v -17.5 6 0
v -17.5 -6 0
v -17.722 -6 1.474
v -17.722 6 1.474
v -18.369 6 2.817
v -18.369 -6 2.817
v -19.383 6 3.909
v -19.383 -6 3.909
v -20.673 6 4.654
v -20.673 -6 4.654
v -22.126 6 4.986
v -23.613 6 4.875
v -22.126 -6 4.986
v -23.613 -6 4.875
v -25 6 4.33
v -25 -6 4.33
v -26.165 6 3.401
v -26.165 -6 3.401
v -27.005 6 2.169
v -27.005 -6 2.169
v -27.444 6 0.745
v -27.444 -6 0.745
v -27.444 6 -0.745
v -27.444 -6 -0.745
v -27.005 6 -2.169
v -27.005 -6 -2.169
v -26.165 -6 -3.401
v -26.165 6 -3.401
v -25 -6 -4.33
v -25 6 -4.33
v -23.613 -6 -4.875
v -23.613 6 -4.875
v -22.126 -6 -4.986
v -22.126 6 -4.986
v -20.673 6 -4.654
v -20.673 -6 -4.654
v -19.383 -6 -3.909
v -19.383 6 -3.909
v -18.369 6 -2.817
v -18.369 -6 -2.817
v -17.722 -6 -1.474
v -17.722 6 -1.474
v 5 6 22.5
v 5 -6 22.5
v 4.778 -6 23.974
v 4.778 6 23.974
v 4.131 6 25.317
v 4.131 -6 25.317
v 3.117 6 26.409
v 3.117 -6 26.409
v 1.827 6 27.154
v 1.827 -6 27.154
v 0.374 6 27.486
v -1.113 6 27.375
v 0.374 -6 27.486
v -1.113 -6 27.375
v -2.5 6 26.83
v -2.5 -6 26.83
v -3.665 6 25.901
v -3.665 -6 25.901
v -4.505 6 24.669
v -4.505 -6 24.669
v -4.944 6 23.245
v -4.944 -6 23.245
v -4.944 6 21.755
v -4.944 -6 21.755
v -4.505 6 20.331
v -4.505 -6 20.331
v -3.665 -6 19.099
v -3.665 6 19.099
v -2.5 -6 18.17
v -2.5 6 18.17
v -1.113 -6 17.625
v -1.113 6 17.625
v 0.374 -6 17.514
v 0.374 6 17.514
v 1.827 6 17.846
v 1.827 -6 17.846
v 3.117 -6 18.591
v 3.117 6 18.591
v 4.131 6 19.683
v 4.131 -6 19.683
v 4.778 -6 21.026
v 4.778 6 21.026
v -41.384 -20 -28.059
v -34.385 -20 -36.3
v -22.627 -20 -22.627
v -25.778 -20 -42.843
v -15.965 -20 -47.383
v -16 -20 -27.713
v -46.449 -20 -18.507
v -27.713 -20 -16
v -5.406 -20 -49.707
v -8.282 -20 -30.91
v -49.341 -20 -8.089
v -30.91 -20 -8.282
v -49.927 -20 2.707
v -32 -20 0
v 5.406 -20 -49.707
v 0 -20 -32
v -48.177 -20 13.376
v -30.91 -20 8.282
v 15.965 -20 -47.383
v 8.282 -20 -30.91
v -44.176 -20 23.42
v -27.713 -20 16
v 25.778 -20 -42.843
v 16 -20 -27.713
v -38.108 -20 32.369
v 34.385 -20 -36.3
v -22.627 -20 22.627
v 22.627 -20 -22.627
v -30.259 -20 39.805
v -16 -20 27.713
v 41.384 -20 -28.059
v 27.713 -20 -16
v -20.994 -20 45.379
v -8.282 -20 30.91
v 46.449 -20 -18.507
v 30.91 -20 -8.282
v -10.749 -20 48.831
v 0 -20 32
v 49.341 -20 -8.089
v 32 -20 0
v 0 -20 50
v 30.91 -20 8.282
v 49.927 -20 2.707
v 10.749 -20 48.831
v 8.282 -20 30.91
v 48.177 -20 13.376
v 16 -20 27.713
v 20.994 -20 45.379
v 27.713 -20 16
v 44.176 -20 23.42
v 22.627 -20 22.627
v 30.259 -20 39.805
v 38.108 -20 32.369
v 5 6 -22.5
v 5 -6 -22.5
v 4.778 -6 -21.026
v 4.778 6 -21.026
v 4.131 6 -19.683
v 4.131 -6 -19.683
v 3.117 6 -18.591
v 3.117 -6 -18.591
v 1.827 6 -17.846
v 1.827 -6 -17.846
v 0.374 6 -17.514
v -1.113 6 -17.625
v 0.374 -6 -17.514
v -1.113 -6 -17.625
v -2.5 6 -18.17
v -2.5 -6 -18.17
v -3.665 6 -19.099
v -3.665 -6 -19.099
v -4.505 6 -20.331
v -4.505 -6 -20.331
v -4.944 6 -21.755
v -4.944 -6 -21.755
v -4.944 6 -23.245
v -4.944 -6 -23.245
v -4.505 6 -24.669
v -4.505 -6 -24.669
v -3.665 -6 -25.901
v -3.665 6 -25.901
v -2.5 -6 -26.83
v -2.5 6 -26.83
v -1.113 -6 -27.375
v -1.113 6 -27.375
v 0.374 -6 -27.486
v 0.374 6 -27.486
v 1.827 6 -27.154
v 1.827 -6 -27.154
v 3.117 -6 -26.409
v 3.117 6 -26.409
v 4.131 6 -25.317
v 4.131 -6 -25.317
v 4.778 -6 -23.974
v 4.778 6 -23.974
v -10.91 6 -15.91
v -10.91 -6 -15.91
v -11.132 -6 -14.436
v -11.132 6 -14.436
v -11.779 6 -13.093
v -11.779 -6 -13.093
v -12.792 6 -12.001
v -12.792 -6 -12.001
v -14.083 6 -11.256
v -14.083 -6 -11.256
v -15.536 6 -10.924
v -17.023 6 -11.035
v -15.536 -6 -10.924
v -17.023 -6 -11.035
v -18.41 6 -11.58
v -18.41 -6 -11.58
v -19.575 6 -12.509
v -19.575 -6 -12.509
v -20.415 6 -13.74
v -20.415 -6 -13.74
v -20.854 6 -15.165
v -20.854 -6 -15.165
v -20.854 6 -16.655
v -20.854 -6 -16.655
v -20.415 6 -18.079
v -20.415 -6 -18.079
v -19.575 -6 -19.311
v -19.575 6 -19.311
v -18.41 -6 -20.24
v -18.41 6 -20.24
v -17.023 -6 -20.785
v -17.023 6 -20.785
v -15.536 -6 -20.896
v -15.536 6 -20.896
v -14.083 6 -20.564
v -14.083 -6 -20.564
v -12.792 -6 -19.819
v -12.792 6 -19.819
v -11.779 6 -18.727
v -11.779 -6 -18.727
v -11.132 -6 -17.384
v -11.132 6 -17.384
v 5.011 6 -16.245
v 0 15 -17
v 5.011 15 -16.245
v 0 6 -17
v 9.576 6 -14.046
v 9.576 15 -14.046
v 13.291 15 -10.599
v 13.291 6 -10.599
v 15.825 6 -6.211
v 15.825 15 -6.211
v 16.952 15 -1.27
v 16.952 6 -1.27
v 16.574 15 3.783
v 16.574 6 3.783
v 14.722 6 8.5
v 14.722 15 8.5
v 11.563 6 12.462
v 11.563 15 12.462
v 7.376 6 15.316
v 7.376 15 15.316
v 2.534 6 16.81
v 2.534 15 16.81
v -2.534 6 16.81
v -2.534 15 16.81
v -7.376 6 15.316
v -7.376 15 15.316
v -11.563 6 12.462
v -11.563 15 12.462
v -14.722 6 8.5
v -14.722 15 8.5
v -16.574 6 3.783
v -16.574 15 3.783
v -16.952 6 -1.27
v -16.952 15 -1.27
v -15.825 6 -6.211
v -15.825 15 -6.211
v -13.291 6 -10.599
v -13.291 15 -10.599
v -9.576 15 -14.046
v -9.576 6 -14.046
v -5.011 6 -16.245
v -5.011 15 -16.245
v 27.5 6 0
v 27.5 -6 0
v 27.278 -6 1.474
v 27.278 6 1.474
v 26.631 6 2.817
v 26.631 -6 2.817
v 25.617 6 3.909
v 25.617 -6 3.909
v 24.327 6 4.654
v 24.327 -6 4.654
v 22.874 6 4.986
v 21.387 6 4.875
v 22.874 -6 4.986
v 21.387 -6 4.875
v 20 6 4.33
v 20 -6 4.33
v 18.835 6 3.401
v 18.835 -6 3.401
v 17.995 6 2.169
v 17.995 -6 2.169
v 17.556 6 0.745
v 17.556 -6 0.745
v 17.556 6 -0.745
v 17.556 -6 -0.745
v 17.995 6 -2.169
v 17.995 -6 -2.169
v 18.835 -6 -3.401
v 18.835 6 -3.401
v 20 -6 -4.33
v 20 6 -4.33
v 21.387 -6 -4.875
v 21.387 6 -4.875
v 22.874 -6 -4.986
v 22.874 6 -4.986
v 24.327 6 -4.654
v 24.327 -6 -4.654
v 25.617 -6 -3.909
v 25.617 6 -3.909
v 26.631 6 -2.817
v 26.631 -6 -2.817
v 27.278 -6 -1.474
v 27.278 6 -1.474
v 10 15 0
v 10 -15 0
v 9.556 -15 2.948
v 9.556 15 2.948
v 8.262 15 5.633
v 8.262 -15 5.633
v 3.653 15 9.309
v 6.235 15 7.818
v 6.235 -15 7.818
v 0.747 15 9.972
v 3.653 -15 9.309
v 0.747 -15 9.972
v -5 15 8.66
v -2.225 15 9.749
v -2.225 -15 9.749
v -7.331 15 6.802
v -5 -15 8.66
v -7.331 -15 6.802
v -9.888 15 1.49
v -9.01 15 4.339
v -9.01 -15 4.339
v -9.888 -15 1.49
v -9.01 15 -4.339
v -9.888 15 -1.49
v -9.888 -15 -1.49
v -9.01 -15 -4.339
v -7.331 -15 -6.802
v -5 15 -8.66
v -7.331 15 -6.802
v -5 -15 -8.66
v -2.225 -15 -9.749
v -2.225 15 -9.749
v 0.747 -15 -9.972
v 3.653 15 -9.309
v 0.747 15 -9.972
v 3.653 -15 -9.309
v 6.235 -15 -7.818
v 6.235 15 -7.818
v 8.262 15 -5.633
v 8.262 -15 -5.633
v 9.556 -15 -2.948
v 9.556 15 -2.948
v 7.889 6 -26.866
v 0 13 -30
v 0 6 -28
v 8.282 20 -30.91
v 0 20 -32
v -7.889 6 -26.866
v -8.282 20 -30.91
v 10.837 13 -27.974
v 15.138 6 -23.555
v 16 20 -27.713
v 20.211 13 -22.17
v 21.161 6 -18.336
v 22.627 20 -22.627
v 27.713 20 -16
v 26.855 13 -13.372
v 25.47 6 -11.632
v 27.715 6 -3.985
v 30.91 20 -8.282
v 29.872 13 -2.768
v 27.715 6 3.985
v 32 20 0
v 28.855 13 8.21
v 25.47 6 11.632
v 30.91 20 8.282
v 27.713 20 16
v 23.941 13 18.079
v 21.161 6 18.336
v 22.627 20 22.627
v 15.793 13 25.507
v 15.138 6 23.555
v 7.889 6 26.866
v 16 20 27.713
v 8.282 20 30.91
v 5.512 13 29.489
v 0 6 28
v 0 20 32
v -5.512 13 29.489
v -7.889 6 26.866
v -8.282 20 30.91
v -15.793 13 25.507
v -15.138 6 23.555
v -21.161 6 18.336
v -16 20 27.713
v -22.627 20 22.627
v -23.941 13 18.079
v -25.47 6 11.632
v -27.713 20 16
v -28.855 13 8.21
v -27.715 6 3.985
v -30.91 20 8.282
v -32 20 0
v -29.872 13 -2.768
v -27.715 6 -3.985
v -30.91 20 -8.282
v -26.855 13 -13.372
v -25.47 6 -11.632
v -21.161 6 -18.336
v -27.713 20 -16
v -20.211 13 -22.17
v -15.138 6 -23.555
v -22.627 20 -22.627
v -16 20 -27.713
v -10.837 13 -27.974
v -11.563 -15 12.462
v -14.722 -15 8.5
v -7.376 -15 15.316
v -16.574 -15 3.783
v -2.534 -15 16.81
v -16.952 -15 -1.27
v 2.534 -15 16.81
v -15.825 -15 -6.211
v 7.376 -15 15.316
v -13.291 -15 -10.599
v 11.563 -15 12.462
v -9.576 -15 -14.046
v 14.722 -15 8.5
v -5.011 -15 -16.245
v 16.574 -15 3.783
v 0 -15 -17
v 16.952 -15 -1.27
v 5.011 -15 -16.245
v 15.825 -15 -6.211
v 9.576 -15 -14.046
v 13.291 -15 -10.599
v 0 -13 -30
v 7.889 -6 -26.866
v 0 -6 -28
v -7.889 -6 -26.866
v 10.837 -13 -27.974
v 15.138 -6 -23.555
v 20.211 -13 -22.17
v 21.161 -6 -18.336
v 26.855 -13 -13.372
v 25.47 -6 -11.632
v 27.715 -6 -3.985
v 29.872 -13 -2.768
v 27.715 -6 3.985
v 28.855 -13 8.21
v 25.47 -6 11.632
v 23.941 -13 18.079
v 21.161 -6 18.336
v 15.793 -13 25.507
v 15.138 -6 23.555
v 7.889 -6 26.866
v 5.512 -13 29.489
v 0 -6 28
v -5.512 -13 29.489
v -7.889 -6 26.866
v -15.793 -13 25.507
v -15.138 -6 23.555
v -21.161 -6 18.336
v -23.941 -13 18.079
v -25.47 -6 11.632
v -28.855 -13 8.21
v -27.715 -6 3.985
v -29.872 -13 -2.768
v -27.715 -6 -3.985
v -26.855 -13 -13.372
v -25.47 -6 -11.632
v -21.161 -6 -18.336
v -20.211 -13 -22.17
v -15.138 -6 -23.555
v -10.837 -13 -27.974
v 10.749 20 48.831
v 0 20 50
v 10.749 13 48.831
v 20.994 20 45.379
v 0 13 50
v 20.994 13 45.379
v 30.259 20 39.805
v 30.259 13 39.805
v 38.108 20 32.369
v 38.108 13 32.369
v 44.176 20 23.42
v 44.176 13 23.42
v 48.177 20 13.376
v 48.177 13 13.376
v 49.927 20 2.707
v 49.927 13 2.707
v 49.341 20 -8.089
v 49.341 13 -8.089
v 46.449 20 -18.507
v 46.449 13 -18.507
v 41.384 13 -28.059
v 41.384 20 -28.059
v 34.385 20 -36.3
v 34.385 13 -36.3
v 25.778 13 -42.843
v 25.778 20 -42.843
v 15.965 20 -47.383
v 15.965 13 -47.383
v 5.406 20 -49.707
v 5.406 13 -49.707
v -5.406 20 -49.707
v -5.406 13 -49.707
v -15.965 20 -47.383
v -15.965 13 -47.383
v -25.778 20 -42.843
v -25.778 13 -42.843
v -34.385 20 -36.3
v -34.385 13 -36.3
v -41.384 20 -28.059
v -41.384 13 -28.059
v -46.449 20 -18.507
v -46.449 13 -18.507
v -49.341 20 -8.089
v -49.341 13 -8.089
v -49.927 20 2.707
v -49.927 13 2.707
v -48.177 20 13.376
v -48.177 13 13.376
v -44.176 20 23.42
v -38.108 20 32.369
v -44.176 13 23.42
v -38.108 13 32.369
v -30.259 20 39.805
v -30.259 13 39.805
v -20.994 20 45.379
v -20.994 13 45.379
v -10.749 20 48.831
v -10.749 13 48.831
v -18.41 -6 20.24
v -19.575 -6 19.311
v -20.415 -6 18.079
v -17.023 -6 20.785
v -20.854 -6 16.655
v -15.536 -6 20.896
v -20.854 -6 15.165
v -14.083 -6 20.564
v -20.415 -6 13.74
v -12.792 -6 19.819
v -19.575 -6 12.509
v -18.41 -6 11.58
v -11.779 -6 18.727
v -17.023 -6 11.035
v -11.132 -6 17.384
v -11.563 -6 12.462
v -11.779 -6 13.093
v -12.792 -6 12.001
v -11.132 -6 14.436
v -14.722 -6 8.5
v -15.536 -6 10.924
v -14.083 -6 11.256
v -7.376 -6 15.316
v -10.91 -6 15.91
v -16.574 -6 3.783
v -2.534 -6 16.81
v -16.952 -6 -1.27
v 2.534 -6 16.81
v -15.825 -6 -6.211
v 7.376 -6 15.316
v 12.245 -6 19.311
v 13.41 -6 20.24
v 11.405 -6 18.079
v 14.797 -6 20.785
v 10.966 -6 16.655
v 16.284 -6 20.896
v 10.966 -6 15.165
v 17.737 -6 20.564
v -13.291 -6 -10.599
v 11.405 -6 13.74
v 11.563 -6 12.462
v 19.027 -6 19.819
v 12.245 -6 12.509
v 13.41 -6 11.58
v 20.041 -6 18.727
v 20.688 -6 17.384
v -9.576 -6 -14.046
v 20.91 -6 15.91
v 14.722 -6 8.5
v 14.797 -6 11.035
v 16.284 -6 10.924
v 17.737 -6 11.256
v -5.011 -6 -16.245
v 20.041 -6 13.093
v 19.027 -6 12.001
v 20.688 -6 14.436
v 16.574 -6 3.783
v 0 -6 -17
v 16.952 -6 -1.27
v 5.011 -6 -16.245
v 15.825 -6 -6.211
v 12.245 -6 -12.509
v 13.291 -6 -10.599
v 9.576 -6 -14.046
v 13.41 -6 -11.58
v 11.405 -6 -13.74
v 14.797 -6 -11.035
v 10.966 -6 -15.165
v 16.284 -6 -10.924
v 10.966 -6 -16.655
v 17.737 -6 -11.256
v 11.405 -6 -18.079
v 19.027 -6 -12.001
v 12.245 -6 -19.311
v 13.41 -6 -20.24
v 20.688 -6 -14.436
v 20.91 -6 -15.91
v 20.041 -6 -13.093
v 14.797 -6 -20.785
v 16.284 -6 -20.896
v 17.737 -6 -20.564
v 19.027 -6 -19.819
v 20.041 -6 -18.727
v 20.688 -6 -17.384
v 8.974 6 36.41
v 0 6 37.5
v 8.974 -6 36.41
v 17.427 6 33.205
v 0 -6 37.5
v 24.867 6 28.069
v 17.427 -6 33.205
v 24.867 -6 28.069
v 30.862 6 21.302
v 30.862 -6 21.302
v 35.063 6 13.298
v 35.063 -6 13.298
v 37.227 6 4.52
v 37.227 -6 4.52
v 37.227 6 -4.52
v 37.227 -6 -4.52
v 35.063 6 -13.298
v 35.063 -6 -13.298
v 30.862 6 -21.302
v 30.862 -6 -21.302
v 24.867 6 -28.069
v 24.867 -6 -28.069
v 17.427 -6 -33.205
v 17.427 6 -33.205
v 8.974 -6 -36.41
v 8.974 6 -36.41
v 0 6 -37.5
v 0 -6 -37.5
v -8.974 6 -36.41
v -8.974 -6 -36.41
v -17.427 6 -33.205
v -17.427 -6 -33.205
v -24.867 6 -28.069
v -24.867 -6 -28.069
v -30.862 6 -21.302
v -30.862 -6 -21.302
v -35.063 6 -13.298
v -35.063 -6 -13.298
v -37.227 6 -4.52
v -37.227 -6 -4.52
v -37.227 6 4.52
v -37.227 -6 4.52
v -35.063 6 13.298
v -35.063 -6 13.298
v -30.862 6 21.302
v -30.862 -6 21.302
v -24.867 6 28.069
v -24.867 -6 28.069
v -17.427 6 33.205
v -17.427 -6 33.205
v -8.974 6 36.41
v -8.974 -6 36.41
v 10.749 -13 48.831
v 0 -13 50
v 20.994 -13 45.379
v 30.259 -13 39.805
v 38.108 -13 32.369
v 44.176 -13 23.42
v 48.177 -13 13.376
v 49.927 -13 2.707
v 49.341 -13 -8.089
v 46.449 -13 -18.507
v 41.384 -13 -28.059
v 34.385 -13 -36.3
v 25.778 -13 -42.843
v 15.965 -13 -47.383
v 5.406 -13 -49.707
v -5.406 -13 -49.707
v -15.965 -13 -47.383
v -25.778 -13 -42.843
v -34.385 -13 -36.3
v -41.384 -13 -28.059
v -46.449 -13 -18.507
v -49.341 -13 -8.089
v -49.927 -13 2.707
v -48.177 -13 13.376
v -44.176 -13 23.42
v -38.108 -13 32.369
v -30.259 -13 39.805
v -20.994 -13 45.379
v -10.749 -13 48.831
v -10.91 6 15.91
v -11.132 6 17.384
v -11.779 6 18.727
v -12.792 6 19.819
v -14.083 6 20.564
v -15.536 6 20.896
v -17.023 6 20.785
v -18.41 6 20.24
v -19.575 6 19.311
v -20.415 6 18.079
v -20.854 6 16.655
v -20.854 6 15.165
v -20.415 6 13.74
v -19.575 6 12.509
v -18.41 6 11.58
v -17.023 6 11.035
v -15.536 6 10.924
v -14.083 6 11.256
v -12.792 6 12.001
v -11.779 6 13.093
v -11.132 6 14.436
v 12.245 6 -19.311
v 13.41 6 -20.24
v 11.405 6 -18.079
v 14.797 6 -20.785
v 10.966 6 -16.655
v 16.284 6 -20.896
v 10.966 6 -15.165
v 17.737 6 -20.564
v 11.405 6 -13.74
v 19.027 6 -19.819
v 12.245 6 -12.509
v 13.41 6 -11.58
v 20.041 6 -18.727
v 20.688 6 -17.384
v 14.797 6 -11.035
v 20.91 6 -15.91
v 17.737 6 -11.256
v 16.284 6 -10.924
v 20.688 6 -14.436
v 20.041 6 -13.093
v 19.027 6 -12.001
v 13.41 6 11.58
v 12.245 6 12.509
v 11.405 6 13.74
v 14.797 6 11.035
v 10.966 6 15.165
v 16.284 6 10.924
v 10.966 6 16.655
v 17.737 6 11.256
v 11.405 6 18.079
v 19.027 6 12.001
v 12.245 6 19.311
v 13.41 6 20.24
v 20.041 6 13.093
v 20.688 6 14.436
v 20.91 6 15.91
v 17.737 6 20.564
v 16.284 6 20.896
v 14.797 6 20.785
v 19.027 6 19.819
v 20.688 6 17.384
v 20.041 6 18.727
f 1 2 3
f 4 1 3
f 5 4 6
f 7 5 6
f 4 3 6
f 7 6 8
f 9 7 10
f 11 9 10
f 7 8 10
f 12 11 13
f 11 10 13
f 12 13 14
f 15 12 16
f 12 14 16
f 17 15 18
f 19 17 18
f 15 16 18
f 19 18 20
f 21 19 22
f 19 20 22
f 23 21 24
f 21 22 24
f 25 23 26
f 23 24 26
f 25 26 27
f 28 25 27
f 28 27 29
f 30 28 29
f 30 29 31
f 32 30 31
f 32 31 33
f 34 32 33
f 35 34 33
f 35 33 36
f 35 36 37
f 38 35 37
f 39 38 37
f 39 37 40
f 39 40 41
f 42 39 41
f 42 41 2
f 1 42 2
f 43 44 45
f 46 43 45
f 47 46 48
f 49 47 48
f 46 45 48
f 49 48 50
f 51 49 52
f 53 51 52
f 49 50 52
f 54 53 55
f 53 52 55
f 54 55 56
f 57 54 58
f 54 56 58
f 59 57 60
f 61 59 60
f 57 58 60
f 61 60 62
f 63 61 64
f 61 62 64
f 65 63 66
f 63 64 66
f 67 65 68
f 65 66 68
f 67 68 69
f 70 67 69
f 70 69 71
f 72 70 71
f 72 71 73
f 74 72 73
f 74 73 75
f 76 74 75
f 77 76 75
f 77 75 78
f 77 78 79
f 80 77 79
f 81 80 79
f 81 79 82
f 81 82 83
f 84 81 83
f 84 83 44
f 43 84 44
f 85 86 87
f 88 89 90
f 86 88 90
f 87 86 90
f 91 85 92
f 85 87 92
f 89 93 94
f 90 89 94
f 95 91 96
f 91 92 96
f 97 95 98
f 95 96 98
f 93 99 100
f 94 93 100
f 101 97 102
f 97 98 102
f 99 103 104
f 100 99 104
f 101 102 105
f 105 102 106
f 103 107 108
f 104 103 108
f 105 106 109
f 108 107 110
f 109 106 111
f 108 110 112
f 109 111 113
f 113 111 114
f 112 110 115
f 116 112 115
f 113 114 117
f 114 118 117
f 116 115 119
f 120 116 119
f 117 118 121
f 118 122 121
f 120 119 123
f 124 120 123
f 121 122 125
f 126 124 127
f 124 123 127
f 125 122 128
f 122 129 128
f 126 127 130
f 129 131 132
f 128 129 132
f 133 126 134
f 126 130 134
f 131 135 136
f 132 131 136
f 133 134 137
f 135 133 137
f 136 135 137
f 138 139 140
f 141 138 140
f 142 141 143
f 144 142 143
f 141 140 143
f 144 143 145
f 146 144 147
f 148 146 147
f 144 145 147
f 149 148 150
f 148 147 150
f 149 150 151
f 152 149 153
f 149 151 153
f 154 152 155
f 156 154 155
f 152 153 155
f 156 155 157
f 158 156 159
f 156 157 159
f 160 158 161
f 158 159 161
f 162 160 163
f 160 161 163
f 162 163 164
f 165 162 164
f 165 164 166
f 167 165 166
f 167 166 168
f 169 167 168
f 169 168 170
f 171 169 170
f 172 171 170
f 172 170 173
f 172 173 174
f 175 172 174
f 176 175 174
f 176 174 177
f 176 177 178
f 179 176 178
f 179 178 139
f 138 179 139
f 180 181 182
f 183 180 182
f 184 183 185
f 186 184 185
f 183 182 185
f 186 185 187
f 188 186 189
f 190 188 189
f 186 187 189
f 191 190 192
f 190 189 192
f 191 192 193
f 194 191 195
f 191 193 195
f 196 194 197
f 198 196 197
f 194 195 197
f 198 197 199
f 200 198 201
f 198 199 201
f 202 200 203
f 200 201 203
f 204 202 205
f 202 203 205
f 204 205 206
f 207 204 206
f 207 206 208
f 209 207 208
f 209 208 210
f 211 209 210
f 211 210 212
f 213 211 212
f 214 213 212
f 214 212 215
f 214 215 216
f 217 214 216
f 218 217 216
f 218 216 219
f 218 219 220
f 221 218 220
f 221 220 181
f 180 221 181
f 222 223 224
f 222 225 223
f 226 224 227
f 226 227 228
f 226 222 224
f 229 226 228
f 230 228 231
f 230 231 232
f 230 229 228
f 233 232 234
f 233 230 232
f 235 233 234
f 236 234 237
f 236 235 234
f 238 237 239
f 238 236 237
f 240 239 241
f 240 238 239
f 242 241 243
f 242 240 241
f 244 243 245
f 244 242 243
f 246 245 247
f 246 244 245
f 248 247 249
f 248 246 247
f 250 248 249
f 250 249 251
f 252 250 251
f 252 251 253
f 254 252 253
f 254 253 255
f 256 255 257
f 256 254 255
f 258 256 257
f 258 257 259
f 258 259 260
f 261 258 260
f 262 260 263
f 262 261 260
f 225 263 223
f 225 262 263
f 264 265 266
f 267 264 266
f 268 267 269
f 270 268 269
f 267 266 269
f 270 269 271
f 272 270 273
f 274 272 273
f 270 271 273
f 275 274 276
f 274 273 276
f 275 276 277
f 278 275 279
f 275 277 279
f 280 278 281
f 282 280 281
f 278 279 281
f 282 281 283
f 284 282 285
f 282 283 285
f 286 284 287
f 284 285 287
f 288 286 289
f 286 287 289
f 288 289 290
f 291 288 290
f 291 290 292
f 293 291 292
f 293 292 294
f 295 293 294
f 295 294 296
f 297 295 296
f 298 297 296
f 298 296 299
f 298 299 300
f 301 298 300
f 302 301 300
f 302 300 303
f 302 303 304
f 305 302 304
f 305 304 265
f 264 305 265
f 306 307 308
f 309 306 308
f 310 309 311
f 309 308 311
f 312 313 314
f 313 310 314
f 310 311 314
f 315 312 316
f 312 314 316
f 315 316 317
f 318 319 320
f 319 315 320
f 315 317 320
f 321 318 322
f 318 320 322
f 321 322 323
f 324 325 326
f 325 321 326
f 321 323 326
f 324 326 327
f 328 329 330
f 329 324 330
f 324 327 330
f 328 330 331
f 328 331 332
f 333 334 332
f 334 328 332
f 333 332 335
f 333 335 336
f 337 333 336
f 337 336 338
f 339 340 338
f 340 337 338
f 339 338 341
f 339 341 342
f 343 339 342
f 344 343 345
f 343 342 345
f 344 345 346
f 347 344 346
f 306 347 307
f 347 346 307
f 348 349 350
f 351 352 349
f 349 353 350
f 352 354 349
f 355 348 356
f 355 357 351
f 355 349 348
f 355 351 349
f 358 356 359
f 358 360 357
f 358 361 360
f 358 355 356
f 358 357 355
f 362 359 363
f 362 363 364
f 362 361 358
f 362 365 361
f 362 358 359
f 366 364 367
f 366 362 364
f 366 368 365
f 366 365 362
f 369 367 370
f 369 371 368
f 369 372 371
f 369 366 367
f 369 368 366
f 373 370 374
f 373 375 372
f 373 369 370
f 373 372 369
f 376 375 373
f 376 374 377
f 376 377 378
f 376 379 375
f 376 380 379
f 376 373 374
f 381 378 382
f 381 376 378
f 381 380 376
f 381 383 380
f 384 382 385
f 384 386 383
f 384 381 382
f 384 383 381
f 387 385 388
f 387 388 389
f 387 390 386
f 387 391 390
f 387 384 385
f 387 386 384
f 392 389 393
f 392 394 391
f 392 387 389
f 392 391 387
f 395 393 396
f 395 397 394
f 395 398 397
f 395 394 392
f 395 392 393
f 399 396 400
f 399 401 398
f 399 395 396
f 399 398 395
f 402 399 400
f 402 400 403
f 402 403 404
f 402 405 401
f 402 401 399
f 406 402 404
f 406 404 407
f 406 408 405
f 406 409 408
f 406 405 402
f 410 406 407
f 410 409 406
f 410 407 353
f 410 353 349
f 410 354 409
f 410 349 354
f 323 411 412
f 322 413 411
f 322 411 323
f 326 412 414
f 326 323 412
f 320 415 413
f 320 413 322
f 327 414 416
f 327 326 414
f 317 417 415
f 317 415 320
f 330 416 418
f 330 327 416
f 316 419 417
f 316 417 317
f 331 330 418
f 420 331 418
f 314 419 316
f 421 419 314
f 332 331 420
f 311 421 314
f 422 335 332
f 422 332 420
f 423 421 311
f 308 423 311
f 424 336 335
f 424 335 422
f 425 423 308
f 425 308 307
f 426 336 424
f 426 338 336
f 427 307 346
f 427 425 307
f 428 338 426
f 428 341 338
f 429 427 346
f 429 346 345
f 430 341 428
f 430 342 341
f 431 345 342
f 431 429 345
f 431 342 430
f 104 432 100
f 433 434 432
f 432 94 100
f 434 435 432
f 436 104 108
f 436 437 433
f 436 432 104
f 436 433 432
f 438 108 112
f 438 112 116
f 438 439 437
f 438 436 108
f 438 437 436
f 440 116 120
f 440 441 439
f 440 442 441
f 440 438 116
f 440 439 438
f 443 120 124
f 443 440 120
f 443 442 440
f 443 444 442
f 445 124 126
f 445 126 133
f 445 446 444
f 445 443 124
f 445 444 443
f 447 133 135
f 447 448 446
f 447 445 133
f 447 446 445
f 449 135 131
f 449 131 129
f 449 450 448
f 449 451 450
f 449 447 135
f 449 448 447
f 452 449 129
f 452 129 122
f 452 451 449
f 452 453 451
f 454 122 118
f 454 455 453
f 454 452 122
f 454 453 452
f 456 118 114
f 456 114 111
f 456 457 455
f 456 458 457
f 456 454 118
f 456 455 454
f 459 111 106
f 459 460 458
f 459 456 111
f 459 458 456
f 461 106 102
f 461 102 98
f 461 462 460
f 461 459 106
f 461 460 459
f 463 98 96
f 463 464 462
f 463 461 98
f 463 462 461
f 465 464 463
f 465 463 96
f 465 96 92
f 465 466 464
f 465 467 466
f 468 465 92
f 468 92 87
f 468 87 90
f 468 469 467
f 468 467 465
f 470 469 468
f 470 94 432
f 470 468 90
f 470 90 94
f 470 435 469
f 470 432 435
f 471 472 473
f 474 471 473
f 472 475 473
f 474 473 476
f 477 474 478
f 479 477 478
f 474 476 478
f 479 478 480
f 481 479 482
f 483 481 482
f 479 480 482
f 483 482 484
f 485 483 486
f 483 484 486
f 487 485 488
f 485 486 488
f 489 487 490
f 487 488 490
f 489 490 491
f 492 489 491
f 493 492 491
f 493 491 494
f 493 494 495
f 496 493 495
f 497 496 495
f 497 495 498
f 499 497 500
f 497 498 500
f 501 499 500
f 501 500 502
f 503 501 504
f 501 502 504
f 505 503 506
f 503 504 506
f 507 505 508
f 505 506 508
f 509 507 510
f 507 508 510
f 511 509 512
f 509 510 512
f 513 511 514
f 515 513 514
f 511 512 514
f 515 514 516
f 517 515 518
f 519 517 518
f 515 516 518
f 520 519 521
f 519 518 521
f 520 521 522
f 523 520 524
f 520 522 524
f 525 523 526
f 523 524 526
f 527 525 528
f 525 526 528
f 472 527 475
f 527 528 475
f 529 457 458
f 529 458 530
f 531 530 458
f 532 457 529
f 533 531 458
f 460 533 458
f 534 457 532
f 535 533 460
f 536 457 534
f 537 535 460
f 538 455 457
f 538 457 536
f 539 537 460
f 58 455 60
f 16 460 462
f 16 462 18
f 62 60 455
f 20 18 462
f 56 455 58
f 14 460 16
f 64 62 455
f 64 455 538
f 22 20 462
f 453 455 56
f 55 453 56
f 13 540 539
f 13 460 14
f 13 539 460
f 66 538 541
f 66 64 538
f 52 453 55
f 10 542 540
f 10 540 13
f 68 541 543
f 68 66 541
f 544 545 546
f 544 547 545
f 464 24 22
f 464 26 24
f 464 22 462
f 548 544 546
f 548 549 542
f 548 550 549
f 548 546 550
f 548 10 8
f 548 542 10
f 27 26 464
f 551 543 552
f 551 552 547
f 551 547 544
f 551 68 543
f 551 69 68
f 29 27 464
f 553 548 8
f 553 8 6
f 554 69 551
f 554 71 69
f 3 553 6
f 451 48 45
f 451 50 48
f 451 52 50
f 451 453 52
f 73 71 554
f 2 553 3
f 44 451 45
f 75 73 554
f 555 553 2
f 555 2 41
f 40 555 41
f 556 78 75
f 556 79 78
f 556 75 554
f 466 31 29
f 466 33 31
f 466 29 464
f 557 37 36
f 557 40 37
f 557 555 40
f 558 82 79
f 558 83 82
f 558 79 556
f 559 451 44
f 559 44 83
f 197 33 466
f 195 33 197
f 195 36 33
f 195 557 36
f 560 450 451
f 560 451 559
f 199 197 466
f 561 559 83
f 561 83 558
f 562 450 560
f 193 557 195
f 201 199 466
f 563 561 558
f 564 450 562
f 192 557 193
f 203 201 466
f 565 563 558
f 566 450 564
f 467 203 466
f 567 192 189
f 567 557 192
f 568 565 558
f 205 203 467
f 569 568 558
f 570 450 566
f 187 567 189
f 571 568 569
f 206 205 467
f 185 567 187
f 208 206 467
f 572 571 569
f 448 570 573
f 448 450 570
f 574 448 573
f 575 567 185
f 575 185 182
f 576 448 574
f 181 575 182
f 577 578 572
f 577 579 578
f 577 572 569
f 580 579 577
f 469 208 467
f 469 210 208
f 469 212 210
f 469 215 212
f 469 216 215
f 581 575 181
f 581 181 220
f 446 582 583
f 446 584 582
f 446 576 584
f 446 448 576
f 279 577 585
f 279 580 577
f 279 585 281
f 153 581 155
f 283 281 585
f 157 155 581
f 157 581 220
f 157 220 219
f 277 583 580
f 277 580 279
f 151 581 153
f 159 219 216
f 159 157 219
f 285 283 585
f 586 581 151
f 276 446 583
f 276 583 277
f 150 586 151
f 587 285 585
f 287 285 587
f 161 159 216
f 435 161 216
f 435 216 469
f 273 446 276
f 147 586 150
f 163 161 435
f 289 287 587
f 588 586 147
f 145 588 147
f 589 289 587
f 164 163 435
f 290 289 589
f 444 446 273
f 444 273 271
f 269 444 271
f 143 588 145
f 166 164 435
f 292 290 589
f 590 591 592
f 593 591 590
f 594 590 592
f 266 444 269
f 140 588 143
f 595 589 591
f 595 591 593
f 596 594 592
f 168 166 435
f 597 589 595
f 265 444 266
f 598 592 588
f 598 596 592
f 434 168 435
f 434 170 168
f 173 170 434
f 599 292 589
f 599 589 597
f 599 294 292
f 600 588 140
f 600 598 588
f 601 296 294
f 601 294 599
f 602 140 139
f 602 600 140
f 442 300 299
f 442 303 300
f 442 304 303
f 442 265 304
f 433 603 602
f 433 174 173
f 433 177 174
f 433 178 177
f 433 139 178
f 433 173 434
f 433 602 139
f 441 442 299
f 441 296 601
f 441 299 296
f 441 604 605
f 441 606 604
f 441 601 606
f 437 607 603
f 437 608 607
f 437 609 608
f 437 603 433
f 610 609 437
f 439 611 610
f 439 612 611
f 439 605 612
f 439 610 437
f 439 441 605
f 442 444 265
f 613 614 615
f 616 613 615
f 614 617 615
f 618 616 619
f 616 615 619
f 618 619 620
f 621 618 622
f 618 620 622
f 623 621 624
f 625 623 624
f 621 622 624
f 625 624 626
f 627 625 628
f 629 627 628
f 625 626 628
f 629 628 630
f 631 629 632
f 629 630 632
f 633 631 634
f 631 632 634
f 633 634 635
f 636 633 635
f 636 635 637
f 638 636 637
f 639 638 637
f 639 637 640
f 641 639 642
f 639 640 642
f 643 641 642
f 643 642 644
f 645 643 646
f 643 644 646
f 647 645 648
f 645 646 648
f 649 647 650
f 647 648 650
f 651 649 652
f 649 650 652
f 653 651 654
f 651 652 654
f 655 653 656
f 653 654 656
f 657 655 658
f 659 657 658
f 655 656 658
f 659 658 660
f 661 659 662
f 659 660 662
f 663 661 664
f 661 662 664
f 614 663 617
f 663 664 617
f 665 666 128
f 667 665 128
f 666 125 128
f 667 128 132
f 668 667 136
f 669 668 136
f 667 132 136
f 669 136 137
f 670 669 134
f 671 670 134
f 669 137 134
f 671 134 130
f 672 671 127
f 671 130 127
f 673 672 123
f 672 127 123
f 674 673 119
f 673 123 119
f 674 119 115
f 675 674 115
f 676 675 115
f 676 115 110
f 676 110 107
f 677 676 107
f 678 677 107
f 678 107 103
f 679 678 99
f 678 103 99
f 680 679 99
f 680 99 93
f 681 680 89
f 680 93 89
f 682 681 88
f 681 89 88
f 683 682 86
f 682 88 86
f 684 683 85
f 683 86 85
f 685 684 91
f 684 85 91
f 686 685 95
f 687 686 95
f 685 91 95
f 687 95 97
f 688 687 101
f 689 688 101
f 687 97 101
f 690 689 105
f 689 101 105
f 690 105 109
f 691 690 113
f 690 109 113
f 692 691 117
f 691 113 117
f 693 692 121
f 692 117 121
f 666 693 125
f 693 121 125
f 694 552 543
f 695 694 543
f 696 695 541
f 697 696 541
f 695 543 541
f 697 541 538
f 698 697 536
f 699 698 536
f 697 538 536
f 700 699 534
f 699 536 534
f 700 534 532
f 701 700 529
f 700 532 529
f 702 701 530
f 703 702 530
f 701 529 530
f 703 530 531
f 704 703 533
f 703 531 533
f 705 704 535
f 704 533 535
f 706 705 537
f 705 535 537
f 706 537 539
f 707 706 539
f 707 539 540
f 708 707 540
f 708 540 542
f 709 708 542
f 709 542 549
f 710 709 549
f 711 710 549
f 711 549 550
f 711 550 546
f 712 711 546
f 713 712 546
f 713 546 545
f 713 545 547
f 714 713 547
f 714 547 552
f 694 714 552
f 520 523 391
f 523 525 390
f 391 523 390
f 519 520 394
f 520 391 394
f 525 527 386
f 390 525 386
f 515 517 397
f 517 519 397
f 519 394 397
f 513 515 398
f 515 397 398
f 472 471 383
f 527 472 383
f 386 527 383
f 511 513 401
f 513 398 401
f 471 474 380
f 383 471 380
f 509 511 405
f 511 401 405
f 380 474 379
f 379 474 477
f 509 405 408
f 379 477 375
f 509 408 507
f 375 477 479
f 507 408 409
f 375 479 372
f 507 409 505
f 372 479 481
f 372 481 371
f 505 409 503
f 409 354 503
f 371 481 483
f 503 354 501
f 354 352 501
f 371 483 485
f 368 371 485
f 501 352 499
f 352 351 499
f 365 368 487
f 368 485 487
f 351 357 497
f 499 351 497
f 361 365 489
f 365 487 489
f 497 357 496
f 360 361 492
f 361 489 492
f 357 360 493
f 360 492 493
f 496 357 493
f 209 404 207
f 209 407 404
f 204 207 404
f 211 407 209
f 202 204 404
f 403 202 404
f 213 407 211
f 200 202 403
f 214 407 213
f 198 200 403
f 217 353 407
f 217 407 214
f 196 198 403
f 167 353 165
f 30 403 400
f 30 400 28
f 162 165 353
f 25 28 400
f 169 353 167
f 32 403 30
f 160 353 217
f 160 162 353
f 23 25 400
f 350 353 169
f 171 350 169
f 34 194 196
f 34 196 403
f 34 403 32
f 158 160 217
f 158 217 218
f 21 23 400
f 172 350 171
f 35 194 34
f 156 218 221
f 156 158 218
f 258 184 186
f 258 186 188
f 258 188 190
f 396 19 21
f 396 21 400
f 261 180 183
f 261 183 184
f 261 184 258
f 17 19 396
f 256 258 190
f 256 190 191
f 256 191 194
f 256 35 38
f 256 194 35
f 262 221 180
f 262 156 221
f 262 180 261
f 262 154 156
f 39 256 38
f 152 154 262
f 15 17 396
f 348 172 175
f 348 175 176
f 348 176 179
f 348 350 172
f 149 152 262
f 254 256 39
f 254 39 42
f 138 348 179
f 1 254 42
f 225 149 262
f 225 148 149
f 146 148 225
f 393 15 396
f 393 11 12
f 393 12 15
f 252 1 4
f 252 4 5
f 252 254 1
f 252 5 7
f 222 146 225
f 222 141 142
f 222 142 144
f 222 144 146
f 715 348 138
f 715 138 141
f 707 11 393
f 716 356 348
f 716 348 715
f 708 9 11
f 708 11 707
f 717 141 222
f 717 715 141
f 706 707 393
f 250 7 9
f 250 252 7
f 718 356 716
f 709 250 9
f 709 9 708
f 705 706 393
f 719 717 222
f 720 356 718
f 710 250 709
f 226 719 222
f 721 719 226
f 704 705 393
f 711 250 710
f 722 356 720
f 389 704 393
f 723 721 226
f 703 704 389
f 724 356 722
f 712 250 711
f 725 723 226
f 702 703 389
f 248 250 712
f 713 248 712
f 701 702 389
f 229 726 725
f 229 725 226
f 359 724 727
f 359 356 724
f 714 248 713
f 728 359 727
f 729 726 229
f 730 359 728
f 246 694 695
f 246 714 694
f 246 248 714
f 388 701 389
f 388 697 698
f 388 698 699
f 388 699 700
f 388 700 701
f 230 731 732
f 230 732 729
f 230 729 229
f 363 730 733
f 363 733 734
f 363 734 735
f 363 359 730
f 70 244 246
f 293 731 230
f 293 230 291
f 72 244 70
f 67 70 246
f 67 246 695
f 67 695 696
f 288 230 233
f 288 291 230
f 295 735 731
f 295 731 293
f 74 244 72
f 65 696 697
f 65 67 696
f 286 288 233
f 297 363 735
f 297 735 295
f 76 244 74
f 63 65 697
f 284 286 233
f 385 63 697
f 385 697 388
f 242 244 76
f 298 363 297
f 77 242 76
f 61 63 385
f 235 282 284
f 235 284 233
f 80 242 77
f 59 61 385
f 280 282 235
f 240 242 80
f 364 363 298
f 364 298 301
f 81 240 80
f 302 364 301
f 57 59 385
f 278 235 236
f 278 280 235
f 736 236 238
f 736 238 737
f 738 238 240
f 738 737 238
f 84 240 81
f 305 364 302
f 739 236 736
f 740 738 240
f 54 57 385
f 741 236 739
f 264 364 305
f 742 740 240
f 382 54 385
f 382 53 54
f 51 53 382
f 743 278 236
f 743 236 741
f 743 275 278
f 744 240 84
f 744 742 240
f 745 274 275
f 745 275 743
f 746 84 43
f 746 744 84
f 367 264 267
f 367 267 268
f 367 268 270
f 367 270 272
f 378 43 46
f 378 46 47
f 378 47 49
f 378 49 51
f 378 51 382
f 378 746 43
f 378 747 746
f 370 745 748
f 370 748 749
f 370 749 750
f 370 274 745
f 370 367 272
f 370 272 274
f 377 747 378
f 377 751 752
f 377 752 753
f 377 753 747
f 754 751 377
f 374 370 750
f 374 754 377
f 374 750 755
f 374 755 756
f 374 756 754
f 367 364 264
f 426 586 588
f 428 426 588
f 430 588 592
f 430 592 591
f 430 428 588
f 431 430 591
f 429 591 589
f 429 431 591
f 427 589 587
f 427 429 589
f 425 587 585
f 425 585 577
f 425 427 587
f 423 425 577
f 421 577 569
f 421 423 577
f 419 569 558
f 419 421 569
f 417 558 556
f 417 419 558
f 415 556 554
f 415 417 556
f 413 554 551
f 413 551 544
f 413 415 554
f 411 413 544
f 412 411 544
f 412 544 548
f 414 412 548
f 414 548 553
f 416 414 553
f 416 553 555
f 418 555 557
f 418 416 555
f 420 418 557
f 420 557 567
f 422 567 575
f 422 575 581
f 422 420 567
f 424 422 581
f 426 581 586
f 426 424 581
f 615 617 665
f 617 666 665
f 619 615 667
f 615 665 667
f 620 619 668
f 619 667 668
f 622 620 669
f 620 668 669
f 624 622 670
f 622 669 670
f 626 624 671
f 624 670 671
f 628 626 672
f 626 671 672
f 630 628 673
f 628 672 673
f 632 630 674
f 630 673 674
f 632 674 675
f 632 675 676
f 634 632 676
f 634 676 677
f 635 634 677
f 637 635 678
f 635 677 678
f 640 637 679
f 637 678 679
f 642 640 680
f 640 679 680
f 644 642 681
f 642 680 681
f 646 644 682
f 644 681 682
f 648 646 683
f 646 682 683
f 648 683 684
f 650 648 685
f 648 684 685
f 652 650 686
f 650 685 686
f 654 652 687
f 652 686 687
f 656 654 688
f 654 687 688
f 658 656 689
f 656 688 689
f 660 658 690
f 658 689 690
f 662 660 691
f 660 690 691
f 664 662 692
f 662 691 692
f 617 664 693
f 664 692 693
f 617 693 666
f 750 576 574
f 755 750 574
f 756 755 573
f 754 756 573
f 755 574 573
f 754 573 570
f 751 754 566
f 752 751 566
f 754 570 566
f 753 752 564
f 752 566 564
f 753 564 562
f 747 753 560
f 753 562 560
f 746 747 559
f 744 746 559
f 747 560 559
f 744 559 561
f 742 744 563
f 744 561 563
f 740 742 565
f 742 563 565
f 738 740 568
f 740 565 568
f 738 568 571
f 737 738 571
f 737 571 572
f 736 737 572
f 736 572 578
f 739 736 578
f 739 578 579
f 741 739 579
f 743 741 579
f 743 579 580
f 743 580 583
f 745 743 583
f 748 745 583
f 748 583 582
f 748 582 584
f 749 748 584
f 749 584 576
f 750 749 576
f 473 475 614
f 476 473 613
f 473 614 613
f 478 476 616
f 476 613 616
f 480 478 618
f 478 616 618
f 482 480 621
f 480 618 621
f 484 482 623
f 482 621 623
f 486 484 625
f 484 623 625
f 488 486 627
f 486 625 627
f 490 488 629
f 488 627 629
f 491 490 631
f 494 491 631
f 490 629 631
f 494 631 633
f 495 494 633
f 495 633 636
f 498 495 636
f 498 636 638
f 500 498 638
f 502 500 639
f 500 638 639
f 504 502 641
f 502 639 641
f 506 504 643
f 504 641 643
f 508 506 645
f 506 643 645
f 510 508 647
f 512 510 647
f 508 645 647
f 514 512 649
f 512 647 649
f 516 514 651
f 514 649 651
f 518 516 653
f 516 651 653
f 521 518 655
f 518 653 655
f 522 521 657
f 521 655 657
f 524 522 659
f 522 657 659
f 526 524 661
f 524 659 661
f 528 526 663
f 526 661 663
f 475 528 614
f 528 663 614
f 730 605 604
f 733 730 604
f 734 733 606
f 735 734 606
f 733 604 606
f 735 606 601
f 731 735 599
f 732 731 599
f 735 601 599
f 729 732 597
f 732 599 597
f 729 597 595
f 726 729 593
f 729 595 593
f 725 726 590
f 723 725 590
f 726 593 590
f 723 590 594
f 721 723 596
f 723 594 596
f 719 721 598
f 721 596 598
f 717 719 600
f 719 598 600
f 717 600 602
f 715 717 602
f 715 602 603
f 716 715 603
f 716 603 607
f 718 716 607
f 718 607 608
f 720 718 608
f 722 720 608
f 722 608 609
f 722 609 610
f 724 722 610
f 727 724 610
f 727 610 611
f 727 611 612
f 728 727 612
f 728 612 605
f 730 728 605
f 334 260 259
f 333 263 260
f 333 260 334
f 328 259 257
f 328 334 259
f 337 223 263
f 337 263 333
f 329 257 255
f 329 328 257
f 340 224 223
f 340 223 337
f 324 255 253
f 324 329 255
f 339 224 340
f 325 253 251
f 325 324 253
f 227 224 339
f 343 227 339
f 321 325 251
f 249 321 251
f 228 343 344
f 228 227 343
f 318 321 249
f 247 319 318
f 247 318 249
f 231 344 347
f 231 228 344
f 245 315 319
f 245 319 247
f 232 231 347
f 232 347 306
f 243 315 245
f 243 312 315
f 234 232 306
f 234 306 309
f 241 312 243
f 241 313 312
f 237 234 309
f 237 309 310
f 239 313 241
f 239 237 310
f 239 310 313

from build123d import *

# Parameters (mm, degrees)
F2_R     = 10
F3_DEPTH = 40
F6_R     = 5
F7_DEPTH = 25


with BuildPart() as f1:
    # F0 (on Right) → F1 (revolve)
    with BuildSketch(Plane.YZ):
        Polygon((-20, 50), (-20, 0), (20, 0), (20, 50), (13, 50), (6, 37.5), (0, 37.5), (-6, 37.5), (-13, 50), align=None)
    revolve(axis=Axis((0, 0, 0), (0, 1, 0)))

    # F2 (on face) → F3 (cut)
    with BuildSketch(Plane.XZ.offset(20)):
        Circle(F2_R)
    extrude(amount=-F3_DEPTH, mode=Mode.SUBTRACT)

    # F4 (on Right) → F5 (revolve, cut)
    with BuildSketch(Plane.YZ):
        Polygon((-15, -10), (-20, -10), (-20, -32), (-6, -28), (-6, -17), (-15, -17), align=None)
        Polygon((15, -17), (6, -17), (6, -28), (20, -32), (20, -10), (15, -10), align=None)
    revolve(axis=Axis((0, -10, 0), (0, -1, 0)), mode=Mode.SUBTRACT)

    # F6 (on face) → F7 (cut)
    with BuildSketch(Plane.XZ.offset(6)):
        with Locations((-15.909903, 15.909903)):
            Circle(F6_R)
        with Locations((0, 22.5)):
            Circle(F6_R)
        with Locations((15.909903, 15.909903)):
            Circle(F6_R)
        with Locations((-22.5, 0)):
            Circle(F6_R)
        with Locations((-15.909903, -15.909903)):
            Circle(F6_R)
        with Locations((0, -22.5)):
            Circle(F6_R)
        with Locations((15.909903, -15.909903)):
            Circle(F6_R)
        with Locations((22.5, 0)):
            Circle(F6_R)
    extrude(amount=-F7_DEPTH, mode=Mode.SUBTRACT)


solid = f1.part
